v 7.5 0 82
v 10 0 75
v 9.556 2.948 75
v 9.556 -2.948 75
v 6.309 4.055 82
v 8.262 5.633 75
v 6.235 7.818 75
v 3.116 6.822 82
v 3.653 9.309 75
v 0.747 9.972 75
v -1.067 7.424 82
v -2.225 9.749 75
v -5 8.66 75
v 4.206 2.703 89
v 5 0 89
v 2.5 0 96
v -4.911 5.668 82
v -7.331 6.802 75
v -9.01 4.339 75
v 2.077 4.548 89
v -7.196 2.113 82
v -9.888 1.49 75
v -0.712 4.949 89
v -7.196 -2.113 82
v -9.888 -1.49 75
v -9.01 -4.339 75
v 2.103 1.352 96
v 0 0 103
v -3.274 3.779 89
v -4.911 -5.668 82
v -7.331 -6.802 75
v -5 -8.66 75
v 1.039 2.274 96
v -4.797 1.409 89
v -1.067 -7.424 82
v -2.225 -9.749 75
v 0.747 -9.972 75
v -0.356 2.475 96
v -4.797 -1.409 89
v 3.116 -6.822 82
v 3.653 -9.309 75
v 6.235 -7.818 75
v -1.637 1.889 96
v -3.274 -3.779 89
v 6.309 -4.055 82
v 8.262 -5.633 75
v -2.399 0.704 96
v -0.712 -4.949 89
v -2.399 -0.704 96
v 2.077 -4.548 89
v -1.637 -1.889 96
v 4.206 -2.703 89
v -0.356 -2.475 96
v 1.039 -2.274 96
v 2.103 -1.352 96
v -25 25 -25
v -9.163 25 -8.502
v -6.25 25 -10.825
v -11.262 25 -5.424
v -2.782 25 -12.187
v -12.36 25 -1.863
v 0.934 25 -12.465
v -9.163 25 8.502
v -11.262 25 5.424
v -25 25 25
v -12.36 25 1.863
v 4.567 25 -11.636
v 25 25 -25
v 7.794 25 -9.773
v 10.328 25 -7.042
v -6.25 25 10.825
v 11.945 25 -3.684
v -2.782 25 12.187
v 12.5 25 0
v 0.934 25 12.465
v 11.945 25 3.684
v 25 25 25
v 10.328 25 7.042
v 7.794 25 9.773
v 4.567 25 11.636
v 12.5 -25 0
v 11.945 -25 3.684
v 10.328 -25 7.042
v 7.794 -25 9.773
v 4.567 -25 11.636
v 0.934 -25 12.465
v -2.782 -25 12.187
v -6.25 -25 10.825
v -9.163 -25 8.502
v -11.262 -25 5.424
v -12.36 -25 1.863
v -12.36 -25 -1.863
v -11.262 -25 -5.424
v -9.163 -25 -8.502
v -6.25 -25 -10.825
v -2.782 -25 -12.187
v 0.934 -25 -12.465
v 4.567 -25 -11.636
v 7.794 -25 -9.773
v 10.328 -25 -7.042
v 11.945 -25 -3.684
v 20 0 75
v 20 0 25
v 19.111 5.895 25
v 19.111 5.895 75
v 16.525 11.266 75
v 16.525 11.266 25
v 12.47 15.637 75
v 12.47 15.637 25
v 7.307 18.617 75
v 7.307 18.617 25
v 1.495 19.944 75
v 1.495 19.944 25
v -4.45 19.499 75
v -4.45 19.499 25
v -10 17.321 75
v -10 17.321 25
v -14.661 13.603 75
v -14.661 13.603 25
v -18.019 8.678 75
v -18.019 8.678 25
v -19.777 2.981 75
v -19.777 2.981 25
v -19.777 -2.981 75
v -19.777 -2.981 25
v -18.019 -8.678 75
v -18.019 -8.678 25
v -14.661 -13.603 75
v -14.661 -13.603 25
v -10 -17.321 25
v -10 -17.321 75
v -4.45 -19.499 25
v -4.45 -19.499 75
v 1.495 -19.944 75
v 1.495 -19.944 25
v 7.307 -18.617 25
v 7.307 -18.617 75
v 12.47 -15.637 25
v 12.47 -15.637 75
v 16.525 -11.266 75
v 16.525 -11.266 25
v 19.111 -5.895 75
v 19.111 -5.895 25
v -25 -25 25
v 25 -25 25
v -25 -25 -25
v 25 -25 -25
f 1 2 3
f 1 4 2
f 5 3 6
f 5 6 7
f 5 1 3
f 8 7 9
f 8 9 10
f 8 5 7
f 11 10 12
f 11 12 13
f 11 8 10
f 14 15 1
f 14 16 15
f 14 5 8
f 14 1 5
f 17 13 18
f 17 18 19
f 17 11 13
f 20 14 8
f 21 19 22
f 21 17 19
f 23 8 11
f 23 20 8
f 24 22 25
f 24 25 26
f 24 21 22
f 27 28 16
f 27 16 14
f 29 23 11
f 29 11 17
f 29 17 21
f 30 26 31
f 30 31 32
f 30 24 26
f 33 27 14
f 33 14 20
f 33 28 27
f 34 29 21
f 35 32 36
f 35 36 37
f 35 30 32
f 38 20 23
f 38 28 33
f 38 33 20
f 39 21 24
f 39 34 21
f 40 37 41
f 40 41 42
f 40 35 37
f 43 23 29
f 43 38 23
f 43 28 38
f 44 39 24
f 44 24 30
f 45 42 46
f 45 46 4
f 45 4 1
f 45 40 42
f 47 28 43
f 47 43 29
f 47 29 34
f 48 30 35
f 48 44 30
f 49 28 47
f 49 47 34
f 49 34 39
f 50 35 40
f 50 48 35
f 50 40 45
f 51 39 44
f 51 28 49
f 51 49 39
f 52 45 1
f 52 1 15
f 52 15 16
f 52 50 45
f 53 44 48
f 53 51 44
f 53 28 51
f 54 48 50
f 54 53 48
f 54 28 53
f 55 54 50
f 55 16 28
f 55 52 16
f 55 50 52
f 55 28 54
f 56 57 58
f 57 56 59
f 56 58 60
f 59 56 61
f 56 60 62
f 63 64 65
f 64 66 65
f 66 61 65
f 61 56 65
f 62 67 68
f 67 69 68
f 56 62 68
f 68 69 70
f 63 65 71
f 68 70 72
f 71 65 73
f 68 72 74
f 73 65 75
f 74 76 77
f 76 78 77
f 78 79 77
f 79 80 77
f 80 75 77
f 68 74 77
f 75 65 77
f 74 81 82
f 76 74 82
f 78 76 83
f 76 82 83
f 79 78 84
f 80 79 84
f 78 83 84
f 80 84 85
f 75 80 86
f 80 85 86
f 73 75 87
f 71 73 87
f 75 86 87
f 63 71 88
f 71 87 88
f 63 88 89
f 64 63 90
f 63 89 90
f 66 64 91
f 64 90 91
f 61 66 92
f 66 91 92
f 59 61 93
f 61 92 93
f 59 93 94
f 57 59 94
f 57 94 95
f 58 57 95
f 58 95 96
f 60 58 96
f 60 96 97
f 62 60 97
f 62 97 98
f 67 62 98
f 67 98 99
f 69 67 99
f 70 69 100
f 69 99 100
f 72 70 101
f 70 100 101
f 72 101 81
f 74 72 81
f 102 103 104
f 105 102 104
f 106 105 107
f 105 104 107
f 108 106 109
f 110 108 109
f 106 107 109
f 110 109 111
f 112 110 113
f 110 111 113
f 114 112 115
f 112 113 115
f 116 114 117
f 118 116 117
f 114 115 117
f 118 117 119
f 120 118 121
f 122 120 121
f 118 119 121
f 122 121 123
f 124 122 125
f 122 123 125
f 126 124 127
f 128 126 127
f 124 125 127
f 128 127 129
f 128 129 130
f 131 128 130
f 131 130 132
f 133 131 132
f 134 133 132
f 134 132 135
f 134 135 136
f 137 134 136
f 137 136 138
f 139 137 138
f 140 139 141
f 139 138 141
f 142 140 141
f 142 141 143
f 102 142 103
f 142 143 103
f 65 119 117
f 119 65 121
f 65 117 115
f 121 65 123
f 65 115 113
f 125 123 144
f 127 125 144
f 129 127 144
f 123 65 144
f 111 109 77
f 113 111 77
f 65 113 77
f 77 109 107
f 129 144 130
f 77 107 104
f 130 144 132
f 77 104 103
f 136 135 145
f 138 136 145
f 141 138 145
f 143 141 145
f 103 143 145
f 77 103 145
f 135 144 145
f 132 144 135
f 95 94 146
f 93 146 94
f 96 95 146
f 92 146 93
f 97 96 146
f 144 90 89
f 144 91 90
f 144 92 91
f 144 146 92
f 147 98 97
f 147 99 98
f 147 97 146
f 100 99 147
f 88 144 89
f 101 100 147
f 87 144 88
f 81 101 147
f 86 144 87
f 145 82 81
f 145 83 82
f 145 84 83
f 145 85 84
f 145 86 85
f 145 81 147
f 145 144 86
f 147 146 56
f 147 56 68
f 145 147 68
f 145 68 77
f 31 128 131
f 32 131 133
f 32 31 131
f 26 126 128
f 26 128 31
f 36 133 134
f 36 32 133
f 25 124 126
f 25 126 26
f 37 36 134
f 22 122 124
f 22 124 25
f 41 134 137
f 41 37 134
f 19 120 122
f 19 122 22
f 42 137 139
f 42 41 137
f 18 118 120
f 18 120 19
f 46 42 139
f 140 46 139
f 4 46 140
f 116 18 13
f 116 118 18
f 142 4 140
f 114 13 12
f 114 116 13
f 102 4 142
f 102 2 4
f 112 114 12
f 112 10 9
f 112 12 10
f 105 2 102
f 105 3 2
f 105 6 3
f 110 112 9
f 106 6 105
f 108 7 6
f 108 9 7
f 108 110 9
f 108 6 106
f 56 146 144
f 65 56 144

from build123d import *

# Parameters (mm, degrees)
F0_W     = 50
F0_H     = 50
F1_DEPTH = 25
F2_R     = 12.5
F3_DEPTH = 50
F4_R     = 20
F5_DEPTH = 50


with BuildPart() as f1:
    # F0 (on Front) → F1 (new body, symmetric)
    with BuildSketch(Plane.XZ):
        Rectangle(F0_W, F0_H)
    extrude(amount=F1_DEPTH, both=True)

    # F2 (on face) → F3 (cut)
    with BuildSketch(Plane.XZ.offset(25)):
        Circle(F2_R)
    extrude(amount=-F3_DEPTH, mode=Mode.SUBTRACT)

    # F4 (on face) → F5 (join)
    with BuildSketch(Plane.XY.offset(25)):
        Circle(F4_R)
    extrude(amount=F5_DEPTH)

    # F6 (on Front) → F7 (revolve)
    with BuildSketch(Plane.XZ):
        Polygon((0, 103), (0, 75), (10, 75), align=None)
    revolve(axis=Axis((0, 0, 89), (0, 0, 1)))


solid = f1.part
